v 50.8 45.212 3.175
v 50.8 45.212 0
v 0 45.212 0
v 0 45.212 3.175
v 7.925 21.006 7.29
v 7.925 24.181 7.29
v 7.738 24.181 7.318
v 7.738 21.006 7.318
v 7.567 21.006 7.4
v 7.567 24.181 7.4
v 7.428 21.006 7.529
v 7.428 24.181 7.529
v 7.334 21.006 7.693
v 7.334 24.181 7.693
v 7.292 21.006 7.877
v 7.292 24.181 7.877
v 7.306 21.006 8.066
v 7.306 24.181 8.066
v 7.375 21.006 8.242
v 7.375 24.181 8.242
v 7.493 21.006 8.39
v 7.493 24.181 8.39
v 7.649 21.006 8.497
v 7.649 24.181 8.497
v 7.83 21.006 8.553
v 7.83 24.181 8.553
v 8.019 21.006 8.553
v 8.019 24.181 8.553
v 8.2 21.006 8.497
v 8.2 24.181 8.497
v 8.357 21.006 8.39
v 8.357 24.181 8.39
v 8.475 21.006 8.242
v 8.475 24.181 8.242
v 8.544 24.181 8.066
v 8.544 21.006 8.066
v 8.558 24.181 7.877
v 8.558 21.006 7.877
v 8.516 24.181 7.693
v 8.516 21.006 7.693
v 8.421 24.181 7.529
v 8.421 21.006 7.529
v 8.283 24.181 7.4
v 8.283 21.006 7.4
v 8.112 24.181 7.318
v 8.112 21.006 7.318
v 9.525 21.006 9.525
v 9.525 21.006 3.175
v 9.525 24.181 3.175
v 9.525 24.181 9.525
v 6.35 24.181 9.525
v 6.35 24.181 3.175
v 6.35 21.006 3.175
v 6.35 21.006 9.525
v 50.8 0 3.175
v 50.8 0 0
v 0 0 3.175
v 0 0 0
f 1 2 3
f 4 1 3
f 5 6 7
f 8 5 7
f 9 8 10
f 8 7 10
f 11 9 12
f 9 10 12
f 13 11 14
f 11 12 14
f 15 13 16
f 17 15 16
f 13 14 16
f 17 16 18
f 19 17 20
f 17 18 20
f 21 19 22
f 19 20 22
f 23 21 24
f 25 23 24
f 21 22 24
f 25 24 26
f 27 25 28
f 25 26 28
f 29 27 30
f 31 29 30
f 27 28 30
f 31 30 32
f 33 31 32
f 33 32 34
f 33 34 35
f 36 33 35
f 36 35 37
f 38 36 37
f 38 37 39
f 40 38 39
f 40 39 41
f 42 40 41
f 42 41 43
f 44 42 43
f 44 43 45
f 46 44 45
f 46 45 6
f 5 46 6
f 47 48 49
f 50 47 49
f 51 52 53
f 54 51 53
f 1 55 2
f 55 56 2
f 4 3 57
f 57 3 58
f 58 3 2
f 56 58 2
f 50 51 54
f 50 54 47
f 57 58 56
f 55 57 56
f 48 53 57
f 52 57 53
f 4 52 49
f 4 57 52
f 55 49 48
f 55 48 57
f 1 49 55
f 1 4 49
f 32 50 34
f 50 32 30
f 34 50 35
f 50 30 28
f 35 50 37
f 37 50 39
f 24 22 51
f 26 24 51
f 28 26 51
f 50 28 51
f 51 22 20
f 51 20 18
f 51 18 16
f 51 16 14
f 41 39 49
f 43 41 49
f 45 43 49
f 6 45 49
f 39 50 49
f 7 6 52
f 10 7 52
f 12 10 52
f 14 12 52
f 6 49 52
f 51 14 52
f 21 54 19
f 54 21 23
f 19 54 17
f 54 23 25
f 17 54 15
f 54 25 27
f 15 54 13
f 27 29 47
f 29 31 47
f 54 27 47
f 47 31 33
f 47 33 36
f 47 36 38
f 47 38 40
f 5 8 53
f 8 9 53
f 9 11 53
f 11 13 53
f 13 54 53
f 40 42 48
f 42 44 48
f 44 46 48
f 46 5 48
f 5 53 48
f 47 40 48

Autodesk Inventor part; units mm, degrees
ref_plane "YZ Plane" through (0, 0, 0) normal (1, 0, 0) x (0, 1, 0)
ref_plane "XZ Plane" through (0, 0, 0) normal (0, 1, 0) x (-1, 0, 0)
ref_plane "XY Plane" through (0, 0, 0) normal (0, 0, 1) x (1, 0, 0)
sketch "Sketch1" plane through (0, 0, 0) normal (0, 0, 1) x (1, 0, 0)
  line L0 (0, 0) -> (50.8, 0)
  line L1 (50.8, 0) -> (50.8, 45.212)
  line L2 (50.8, 45.212) -> (0, 45.212)
  line L3 (0, 45.212) -> (0, 0)
  dimension "d0" = 50.8
  dimension "d1" = 45.212
extrude "Extrusion1" add sketch "Sketch1" along normal blind 3.175
sketch "Sketch3" plane through (0, 0, 3.175) normal (0, 0, 1) x (1, 0, 0)
  point P0 (0, 0)
sketch "Sketch4" plane through (0, 0, 3.175) normal (0, 0, 1) x (1, 0, 0)
  point P0 (0, 0)
sketch "Sketch5" plane through (0, 0, 3.175) normal (0, 0, 1) x (1, 0, 0)
  line L0 (6.35, 21.0058) -> (9.525, 21.0058)
  line L1 (9.525, 21.0058) -> (9.525, 24.1808)
  line L2 (9.525, 24.1808) -> (6.35, 24.1808)
  line L3 (6.35, 24.1808) -> (6.35, 21.0058)
  point P0 (0, 0)
  dimension "d12" = 3.175
  dimension "d13" = 3.175
extrude "Extrusion3" add sketch "Sketch5" along normal blind 6.35
hole "Hole1" at (7.9248, 21.0058, 7.9248) direction (0, 1, 0) diameter 1.27 end through all
properties part number "HingePart1MK2"
